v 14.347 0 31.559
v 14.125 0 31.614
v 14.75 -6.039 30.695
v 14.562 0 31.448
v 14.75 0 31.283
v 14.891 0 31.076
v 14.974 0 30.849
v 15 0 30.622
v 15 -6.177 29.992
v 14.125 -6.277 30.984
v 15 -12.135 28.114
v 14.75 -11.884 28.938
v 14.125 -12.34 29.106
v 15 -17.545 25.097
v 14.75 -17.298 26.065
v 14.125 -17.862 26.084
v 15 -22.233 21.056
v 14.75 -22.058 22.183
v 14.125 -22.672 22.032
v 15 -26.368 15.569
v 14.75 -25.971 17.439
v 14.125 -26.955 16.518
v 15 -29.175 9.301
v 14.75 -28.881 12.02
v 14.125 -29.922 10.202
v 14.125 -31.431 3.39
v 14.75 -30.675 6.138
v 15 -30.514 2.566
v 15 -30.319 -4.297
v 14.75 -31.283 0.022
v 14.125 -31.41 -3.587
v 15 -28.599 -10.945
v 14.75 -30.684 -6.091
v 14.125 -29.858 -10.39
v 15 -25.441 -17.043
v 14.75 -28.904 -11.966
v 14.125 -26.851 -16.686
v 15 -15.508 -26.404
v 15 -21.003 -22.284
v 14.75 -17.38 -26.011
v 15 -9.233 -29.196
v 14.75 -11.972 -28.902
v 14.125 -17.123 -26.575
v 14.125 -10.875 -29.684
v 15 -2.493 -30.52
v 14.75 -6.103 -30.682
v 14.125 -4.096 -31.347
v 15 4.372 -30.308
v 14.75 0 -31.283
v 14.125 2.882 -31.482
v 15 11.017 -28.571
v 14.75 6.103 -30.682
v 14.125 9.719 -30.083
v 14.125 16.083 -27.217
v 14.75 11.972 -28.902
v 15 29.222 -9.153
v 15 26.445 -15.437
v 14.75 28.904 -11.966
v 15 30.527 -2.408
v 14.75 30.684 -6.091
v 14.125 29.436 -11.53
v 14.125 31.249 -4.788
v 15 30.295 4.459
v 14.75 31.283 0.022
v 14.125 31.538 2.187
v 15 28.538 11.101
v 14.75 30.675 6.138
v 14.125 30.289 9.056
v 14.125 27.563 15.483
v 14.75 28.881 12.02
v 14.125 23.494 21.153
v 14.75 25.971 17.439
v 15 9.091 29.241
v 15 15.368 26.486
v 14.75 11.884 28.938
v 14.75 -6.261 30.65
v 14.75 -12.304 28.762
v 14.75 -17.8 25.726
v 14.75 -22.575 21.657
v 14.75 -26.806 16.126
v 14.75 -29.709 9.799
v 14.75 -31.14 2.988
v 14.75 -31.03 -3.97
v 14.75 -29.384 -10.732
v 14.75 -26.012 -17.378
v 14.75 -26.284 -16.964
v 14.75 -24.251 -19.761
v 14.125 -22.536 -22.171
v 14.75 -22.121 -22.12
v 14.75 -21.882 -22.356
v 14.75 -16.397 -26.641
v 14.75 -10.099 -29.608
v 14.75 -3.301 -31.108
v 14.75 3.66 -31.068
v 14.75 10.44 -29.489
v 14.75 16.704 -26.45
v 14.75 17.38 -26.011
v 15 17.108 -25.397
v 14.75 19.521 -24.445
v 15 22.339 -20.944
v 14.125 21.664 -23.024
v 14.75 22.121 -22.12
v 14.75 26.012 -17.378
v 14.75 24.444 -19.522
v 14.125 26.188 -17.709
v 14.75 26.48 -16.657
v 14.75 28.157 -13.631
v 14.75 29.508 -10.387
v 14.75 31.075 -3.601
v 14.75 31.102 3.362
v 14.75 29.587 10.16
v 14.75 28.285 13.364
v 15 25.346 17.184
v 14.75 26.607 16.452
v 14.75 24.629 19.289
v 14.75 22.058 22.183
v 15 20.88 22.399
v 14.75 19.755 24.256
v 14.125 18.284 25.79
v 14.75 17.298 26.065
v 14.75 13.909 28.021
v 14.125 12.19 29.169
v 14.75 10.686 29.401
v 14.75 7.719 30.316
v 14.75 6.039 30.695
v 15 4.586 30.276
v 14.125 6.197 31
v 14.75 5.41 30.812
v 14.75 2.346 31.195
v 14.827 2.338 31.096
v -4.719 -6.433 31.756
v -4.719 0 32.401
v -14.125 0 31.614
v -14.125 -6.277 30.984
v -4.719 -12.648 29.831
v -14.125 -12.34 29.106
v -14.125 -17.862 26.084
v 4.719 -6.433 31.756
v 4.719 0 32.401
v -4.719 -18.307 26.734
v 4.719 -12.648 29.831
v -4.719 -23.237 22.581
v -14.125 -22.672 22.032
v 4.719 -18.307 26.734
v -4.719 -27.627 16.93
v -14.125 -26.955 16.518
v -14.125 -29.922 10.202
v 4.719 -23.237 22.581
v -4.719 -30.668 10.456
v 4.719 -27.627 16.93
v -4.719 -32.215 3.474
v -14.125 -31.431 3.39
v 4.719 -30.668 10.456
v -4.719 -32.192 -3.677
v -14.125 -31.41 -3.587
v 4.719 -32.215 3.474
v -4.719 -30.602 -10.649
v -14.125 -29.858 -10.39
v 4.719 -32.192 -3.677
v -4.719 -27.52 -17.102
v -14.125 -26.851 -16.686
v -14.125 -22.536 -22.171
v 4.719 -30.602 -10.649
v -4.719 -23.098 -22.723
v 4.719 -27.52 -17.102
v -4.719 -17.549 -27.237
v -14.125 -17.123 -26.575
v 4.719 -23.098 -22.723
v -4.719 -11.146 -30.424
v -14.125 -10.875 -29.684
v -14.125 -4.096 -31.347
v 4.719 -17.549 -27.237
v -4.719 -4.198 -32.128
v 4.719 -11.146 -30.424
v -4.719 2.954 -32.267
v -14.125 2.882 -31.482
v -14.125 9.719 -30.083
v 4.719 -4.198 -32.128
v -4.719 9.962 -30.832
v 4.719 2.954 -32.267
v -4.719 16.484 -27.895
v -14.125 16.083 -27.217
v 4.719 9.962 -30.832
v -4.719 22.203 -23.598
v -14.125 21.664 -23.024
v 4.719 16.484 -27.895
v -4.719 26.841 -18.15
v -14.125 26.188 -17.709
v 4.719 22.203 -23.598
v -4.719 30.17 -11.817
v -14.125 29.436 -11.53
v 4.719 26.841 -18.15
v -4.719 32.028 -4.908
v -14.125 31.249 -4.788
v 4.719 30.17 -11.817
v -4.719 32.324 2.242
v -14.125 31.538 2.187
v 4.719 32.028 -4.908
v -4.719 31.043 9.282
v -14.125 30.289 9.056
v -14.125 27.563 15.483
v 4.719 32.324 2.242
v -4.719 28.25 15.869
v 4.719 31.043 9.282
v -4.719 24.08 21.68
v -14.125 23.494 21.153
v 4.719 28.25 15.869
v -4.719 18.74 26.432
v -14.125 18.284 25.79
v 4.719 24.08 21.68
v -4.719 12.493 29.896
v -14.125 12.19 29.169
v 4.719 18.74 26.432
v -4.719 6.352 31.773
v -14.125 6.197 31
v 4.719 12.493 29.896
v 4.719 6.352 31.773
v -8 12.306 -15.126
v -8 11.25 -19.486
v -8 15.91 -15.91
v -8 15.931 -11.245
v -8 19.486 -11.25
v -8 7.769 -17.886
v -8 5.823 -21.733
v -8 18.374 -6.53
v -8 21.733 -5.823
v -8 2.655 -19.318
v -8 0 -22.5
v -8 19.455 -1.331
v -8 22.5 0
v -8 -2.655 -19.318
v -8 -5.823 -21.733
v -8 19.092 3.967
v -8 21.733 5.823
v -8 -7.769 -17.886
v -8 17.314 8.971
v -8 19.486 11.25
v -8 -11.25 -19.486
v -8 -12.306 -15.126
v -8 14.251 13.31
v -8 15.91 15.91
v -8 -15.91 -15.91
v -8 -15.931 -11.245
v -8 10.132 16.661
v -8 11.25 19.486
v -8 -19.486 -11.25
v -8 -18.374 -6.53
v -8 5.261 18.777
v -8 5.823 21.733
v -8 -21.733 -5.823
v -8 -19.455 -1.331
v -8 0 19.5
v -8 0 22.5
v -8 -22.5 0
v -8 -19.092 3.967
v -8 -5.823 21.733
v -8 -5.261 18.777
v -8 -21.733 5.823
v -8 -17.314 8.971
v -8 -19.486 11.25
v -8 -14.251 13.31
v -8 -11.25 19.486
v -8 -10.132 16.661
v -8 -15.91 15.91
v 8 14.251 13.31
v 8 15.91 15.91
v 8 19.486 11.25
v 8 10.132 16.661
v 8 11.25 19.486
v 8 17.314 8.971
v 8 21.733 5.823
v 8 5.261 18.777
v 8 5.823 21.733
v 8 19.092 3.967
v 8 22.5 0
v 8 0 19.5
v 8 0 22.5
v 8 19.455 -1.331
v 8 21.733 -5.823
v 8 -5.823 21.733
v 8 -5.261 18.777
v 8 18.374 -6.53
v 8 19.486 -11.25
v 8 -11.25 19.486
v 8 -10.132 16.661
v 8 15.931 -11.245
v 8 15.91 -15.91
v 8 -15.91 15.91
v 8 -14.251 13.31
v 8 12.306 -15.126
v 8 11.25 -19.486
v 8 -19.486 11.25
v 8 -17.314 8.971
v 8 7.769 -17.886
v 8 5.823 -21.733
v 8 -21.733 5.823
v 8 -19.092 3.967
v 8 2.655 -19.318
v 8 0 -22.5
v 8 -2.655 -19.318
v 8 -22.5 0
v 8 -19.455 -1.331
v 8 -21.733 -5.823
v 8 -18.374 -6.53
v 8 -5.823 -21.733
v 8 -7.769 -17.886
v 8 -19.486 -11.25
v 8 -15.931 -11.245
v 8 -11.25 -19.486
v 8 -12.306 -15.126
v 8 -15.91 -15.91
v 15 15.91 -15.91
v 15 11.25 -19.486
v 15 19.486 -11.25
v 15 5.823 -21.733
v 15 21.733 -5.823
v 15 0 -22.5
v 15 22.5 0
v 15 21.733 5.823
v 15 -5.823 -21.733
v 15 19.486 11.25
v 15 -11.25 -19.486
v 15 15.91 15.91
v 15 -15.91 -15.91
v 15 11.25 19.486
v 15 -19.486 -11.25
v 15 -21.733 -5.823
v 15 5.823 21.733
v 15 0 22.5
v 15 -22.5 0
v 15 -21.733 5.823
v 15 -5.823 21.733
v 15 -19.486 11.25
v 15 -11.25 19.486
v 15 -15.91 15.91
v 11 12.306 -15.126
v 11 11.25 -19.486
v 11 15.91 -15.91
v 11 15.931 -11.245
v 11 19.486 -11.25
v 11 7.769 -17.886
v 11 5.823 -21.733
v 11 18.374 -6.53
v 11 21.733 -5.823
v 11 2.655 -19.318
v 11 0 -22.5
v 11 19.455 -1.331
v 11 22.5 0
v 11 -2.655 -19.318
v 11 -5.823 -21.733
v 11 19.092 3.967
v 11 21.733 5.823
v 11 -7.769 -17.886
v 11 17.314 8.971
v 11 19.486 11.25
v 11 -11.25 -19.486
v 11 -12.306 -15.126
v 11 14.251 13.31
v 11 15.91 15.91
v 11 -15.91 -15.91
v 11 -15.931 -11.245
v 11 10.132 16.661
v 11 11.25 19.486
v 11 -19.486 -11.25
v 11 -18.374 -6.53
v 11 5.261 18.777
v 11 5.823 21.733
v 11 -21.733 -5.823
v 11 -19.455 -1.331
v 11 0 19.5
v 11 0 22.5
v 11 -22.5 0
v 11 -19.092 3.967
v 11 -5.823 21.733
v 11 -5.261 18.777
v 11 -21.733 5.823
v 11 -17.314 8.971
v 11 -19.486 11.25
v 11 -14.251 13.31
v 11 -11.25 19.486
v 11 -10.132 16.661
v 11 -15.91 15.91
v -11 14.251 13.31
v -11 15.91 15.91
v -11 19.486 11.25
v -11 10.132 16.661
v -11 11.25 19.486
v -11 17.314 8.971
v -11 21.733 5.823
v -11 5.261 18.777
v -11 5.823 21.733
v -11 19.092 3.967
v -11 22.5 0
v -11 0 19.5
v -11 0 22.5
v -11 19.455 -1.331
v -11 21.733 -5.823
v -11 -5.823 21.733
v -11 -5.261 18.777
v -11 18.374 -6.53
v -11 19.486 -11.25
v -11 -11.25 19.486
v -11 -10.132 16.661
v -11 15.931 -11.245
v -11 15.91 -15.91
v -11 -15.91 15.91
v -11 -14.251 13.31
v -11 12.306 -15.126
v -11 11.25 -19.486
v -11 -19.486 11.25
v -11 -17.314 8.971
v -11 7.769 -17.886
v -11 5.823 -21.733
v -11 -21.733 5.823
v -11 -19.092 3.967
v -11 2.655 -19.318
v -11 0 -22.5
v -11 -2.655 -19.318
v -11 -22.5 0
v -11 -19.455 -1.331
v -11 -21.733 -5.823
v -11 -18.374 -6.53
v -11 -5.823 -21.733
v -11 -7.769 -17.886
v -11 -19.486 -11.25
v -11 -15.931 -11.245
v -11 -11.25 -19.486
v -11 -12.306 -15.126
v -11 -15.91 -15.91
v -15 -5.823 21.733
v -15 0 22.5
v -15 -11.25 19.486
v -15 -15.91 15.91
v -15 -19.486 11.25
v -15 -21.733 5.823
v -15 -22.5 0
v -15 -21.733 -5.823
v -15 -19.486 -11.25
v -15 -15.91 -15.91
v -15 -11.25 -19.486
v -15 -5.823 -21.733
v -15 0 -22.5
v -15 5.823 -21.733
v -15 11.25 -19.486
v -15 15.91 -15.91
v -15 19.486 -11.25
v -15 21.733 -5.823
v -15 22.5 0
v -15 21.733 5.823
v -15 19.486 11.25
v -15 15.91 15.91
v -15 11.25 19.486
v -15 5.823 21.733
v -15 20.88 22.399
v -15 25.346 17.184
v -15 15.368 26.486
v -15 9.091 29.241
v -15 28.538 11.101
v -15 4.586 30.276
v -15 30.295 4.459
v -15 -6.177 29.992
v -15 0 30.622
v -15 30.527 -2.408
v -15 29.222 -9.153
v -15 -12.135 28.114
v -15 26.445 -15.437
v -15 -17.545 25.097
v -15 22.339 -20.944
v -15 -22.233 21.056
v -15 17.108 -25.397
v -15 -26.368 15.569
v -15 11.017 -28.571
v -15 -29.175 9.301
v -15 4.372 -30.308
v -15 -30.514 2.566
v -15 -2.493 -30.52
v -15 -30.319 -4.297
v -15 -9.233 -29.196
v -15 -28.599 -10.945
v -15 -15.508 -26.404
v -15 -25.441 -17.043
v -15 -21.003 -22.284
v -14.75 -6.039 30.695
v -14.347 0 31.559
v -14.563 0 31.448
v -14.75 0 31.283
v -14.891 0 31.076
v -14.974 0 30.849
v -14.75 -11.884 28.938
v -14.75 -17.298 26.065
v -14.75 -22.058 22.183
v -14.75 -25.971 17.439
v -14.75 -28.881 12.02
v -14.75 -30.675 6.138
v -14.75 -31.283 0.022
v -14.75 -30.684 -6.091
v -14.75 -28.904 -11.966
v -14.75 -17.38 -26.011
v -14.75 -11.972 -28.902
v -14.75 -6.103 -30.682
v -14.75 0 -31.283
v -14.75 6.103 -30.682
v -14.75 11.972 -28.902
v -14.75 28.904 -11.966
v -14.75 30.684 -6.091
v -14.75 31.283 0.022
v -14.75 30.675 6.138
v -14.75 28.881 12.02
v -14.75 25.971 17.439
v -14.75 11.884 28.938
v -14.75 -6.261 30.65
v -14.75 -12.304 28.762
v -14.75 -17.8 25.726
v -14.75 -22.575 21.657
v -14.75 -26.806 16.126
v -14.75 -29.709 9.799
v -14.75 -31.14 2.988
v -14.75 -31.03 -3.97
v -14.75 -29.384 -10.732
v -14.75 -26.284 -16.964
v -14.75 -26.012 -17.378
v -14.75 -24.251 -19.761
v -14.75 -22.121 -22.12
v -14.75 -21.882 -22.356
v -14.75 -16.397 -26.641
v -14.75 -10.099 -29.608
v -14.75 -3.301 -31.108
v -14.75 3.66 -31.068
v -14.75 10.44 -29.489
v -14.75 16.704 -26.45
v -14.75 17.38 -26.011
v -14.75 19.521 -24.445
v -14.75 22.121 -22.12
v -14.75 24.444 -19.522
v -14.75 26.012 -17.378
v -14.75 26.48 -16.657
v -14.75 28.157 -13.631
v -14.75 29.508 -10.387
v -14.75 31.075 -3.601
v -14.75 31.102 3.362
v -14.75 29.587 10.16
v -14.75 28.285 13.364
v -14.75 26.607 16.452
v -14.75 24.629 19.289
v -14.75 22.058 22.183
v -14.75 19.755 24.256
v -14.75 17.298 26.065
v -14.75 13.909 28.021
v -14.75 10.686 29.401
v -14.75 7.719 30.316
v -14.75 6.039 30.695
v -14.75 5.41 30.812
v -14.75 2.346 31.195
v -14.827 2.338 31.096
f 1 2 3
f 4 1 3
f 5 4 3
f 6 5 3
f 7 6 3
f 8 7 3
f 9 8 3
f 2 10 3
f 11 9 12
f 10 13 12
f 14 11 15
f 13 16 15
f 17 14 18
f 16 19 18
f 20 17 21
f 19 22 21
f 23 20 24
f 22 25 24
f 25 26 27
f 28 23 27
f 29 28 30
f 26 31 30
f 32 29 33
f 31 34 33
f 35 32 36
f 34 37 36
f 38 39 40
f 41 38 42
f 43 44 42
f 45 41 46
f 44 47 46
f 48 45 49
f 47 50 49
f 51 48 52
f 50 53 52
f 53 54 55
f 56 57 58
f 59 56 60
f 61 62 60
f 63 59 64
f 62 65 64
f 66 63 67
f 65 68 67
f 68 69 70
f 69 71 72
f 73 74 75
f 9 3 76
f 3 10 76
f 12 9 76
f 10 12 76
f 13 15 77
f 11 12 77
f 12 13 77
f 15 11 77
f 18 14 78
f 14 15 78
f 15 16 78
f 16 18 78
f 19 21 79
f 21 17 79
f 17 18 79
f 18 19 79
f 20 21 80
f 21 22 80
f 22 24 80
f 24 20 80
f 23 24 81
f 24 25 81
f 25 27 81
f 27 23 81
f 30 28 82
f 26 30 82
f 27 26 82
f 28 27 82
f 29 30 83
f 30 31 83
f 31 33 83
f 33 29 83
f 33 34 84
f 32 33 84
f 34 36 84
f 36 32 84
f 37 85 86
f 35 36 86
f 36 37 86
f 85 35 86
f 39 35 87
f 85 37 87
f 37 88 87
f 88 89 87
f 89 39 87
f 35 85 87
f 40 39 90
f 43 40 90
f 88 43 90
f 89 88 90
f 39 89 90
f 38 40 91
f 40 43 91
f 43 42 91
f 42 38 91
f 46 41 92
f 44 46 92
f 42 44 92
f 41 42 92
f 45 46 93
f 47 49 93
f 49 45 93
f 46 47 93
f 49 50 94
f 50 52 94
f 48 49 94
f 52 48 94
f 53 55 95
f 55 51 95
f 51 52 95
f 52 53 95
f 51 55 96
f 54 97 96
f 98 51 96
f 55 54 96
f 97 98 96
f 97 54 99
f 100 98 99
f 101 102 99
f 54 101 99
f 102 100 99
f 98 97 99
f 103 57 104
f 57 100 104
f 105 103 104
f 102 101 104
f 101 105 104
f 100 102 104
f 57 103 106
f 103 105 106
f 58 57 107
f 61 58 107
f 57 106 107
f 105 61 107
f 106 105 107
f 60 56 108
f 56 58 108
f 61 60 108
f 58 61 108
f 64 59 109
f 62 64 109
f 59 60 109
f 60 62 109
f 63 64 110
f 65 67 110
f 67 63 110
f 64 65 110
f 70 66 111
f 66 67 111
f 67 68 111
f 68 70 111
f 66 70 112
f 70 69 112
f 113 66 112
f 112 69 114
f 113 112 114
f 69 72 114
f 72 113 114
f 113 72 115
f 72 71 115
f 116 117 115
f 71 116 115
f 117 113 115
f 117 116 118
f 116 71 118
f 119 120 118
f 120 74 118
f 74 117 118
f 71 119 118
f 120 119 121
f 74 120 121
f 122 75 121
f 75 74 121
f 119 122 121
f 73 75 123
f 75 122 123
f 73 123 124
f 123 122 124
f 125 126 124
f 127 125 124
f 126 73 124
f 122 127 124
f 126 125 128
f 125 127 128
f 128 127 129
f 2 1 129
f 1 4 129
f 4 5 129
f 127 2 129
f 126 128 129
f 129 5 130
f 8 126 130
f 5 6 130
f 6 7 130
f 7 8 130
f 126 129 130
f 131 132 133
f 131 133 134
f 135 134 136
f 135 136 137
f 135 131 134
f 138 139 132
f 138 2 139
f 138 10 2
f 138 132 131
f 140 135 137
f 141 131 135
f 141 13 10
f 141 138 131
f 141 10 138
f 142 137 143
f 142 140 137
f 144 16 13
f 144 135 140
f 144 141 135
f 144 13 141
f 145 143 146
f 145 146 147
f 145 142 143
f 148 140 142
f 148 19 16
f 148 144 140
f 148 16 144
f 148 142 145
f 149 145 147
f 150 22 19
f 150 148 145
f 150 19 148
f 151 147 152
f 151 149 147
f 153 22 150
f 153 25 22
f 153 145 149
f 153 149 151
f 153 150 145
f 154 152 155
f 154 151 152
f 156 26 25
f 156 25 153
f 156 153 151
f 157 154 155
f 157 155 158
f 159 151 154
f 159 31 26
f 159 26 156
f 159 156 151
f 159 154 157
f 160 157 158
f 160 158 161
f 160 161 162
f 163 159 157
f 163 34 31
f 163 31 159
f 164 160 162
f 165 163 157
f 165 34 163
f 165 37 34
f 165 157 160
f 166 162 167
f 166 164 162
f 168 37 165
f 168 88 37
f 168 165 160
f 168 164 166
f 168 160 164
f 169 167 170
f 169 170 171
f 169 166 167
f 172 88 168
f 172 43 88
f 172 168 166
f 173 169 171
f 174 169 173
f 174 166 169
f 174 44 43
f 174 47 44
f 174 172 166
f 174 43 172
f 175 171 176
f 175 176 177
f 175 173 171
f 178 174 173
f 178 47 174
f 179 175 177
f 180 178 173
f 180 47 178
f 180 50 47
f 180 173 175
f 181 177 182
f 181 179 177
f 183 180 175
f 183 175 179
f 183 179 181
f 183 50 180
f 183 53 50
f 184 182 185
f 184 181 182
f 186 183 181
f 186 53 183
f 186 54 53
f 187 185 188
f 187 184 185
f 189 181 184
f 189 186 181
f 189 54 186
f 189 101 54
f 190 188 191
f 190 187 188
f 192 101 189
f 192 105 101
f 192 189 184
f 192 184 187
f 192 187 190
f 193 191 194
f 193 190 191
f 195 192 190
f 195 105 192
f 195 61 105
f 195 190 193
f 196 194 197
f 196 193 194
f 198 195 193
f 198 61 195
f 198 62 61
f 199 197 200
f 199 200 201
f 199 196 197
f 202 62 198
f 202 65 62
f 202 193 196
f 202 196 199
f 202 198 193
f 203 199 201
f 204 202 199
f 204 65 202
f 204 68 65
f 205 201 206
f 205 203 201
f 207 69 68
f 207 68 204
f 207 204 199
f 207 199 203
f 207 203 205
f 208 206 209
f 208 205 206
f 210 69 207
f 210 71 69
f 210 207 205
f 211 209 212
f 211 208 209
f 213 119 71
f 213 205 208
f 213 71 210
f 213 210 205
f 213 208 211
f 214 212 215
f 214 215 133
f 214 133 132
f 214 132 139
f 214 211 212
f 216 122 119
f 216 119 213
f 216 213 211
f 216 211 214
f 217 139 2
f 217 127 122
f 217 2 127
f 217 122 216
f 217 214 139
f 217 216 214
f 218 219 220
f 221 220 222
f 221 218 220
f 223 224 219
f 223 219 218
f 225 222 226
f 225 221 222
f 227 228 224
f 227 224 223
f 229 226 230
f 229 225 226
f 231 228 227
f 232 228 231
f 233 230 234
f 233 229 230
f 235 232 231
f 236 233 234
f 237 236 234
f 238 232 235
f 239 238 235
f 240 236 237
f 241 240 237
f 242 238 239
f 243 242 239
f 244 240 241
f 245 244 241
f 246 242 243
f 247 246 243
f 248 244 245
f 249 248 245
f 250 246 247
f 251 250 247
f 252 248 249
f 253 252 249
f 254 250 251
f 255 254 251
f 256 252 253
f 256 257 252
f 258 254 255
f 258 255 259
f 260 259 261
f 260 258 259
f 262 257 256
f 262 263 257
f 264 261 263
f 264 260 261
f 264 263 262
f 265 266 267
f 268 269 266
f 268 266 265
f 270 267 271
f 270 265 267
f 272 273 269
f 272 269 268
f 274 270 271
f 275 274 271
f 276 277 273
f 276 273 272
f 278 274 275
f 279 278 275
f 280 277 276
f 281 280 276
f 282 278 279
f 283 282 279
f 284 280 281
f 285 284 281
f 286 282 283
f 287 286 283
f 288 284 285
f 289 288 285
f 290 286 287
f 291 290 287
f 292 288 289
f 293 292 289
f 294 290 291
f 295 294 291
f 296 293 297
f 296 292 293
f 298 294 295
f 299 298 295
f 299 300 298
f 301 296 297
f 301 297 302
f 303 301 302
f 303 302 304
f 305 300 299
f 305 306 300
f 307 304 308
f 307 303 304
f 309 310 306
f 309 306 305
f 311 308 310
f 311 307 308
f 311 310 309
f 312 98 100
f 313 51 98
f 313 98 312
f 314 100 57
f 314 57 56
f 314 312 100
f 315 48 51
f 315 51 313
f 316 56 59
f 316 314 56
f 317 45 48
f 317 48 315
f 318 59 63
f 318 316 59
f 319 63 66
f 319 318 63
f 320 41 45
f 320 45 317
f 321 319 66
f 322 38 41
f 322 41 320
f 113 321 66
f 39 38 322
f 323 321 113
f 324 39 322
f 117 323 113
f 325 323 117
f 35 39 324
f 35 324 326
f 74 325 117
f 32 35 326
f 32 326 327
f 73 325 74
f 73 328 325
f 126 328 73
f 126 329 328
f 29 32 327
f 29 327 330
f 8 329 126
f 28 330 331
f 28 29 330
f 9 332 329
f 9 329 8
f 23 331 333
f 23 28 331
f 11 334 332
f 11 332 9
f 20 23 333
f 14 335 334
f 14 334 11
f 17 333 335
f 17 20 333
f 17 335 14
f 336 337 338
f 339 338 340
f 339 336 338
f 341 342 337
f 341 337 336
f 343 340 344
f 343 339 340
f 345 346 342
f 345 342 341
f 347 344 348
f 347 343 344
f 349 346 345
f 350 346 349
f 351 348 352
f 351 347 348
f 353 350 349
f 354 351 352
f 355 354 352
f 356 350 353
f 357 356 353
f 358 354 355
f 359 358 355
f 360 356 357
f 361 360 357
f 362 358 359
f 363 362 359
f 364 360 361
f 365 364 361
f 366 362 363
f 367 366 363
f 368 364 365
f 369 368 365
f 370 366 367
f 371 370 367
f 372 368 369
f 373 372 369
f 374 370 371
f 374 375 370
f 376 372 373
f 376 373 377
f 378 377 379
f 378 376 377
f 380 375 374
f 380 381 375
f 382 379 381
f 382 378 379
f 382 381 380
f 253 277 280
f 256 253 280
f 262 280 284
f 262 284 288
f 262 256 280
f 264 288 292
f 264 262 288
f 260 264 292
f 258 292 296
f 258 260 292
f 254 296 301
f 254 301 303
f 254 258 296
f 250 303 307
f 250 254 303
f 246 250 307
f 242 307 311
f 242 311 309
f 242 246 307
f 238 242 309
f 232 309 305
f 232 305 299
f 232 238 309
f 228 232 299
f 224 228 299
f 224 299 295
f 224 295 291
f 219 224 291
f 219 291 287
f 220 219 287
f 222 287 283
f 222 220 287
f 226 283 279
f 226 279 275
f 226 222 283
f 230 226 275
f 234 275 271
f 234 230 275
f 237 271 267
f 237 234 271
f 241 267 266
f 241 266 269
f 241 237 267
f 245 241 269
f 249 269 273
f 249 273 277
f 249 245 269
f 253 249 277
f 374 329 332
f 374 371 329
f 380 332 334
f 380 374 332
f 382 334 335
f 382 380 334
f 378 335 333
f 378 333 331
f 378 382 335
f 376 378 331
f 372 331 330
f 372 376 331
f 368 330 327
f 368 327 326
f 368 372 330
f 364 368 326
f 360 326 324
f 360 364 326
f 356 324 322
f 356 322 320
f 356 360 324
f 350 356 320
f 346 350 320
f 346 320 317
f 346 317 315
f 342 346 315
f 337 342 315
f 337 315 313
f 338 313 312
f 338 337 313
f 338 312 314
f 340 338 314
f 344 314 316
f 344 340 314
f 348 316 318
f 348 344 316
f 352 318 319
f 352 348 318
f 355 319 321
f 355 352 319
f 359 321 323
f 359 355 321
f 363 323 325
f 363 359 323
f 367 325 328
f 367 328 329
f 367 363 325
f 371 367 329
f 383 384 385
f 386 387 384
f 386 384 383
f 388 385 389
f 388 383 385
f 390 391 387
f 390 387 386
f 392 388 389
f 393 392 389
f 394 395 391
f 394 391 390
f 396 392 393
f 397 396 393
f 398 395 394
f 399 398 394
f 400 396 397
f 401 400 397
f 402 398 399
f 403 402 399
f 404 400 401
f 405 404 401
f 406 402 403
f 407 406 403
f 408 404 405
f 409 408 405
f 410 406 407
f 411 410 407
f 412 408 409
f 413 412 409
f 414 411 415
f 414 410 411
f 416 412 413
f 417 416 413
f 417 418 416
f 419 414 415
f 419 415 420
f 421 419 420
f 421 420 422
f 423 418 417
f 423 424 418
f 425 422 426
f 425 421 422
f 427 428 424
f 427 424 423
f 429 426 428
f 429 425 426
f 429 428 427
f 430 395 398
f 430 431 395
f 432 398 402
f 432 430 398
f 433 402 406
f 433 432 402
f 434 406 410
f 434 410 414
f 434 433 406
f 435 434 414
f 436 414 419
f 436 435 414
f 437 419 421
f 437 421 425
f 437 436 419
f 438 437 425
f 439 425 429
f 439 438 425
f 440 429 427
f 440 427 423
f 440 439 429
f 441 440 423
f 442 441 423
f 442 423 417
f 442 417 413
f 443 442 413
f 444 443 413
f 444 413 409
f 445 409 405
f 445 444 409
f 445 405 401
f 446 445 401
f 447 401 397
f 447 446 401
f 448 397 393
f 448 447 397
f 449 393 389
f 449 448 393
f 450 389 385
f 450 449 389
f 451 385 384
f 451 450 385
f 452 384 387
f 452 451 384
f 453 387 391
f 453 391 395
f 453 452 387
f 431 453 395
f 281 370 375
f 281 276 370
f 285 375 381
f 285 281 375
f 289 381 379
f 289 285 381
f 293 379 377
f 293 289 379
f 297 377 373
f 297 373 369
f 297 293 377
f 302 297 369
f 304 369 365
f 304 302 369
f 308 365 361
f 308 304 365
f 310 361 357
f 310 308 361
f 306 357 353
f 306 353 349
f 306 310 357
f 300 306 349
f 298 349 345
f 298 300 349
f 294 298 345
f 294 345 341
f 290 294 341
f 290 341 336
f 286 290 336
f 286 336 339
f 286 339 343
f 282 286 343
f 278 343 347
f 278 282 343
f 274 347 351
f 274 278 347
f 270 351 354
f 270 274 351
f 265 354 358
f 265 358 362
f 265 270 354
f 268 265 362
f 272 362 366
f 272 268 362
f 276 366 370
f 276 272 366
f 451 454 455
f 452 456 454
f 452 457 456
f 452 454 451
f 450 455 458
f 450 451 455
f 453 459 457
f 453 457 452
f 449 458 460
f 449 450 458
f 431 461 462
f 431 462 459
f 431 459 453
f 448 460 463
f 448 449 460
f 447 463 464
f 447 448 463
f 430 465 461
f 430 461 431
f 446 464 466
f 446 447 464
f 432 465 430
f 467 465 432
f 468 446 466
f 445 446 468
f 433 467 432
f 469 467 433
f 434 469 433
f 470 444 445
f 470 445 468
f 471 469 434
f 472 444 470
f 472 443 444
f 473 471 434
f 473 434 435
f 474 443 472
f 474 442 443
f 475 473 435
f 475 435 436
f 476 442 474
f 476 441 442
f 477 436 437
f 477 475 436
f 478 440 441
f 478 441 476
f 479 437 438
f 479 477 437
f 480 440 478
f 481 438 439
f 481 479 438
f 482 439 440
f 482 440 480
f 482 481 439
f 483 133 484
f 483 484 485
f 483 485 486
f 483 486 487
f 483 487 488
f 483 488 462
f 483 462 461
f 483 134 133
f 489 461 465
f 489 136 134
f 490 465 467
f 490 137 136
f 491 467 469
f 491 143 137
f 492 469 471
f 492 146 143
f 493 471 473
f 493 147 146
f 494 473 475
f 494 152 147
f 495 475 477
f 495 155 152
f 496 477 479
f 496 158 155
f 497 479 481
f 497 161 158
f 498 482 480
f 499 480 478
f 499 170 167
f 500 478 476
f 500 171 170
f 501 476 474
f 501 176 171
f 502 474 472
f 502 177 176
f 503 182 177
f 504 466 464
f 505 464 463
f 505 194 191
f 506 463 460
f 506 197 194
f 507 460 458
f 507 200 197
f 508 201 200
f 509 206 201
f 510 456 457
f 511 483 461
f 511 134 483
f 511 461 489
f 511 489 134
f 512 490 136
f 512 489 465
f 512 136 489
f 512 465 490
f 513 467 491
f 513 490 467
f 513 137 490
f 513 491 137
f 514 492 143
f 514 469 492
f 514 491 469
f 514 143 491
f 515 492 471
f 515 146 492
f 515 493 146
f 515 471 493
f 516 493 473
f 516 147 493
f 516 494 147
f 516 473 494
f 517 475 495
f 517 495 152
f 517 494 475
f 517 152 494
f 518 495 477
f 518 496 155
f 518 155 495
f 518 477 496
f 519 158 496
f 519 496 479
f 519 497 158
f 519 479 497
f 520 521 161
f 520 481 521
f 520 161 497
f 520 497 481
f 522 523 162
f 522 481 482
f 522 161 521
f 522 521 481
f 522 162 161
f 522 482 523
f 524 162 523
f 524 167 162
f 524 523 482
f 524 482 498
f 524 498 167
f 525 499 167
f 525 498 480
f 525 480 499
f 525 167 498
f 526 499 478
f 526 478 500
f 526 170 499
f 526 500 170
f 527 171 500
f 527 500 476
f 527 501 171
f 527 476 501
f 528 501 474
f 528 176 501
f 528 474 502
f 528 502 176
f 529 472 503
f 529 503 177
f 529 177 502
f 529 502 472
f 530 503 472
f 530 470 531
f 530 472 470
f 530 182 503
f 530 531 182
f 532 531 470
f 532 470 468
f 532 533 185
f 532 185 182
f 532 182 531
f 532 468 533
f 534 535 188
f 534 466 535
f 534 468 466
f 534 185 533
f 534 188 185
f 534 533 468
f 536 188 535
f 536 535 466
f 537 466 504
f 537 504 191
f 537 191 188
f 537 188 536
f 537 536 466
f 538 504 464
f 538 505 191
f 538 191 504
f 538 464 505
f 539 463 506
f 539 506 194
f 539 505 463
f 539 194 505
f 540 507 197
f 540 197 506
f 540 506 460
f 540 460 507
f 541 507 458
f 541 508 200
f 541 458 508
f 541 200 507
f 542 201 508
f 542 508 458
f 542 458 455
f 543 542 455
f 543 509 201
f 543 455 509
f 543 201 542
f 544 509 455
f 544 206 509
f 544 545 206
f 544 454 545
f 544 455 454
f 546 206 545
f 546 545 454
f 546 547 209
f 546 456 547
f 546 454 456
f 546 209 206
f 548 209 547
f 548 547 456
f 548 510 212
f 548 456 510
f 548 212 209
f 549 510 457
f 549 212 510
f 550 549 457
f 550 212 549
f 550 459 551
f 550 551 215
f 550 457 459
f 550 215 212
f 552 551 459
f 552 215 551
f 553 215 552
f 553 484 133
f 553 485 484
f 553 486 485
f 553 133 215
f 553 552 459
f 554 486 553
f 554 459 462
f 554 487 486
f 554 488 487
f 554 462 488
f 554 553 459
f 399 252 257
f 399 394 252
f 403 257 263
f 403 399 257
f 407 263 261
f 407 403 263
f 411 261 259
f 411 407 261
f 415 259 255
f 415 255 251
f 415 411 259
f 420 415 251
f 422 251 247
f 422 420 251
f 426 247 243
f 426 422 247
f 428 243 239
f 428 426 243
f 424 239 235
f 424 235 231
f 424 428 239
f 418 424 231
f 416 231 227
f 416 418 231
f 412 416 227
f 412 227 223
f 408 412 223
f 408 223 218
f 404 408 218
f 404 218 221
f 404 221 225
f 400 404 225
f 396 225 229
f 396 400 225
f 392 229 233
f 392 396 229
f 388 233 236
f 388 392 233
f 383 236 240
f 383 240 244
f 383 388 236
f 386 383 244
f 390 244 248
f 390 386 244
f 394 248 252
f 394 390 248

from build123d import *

# Parameters (mm, degrees)
FILLET_1_R = 1


with BuildPart() as part:
    # Эскиз1 → Повернуть1 (revolve)
    with BuildSketch(Plane.XY, mode=Mode.PRIVATE) as revolve_1_sk:
        with BuildLine():
            ThreePointArc((-15, 31.5), (0, 32.5), (15, 31.5))
            Line((15, 31.5), (15, 22.5))
            Line((15, 22.5), (11, 22.5))
            Line((11, 22.5), (11, 19.5))
            Line((11, 19.5), (8, 19.5))
            Line((8, 19.5), (8, 22.5))
            Line((8, 22.5), (-8, 22.5))
            Line((-8, 22.5), (-8, 19.5))
            Line((-8, 19.5), (-11, 19.5))
            Line((-11, 19.5), (-11, 22.5))
            Line((-11, 22.5), (-15, 22.5))
            Line((-15, 22.5), (-15, 31.5))
        make_face()
    revolve(revolve_1_sk.sketch.rotate(Axis((-27.729022135, 0, 0), (1, 0, 0)), 90), axis=Axis((-27.729022135, 0, 0), (1, 0, 0)))

    # Скругление1
    fillet_1_edges = [part.edges().sort_by_distance(p)[0] for p in [
        (15, 0, -31.5),
        (-15, 0, -31.5),
    ]]
    fillet(fillet_1_edges, radius=FILLET_1_R)


solid = part.part
